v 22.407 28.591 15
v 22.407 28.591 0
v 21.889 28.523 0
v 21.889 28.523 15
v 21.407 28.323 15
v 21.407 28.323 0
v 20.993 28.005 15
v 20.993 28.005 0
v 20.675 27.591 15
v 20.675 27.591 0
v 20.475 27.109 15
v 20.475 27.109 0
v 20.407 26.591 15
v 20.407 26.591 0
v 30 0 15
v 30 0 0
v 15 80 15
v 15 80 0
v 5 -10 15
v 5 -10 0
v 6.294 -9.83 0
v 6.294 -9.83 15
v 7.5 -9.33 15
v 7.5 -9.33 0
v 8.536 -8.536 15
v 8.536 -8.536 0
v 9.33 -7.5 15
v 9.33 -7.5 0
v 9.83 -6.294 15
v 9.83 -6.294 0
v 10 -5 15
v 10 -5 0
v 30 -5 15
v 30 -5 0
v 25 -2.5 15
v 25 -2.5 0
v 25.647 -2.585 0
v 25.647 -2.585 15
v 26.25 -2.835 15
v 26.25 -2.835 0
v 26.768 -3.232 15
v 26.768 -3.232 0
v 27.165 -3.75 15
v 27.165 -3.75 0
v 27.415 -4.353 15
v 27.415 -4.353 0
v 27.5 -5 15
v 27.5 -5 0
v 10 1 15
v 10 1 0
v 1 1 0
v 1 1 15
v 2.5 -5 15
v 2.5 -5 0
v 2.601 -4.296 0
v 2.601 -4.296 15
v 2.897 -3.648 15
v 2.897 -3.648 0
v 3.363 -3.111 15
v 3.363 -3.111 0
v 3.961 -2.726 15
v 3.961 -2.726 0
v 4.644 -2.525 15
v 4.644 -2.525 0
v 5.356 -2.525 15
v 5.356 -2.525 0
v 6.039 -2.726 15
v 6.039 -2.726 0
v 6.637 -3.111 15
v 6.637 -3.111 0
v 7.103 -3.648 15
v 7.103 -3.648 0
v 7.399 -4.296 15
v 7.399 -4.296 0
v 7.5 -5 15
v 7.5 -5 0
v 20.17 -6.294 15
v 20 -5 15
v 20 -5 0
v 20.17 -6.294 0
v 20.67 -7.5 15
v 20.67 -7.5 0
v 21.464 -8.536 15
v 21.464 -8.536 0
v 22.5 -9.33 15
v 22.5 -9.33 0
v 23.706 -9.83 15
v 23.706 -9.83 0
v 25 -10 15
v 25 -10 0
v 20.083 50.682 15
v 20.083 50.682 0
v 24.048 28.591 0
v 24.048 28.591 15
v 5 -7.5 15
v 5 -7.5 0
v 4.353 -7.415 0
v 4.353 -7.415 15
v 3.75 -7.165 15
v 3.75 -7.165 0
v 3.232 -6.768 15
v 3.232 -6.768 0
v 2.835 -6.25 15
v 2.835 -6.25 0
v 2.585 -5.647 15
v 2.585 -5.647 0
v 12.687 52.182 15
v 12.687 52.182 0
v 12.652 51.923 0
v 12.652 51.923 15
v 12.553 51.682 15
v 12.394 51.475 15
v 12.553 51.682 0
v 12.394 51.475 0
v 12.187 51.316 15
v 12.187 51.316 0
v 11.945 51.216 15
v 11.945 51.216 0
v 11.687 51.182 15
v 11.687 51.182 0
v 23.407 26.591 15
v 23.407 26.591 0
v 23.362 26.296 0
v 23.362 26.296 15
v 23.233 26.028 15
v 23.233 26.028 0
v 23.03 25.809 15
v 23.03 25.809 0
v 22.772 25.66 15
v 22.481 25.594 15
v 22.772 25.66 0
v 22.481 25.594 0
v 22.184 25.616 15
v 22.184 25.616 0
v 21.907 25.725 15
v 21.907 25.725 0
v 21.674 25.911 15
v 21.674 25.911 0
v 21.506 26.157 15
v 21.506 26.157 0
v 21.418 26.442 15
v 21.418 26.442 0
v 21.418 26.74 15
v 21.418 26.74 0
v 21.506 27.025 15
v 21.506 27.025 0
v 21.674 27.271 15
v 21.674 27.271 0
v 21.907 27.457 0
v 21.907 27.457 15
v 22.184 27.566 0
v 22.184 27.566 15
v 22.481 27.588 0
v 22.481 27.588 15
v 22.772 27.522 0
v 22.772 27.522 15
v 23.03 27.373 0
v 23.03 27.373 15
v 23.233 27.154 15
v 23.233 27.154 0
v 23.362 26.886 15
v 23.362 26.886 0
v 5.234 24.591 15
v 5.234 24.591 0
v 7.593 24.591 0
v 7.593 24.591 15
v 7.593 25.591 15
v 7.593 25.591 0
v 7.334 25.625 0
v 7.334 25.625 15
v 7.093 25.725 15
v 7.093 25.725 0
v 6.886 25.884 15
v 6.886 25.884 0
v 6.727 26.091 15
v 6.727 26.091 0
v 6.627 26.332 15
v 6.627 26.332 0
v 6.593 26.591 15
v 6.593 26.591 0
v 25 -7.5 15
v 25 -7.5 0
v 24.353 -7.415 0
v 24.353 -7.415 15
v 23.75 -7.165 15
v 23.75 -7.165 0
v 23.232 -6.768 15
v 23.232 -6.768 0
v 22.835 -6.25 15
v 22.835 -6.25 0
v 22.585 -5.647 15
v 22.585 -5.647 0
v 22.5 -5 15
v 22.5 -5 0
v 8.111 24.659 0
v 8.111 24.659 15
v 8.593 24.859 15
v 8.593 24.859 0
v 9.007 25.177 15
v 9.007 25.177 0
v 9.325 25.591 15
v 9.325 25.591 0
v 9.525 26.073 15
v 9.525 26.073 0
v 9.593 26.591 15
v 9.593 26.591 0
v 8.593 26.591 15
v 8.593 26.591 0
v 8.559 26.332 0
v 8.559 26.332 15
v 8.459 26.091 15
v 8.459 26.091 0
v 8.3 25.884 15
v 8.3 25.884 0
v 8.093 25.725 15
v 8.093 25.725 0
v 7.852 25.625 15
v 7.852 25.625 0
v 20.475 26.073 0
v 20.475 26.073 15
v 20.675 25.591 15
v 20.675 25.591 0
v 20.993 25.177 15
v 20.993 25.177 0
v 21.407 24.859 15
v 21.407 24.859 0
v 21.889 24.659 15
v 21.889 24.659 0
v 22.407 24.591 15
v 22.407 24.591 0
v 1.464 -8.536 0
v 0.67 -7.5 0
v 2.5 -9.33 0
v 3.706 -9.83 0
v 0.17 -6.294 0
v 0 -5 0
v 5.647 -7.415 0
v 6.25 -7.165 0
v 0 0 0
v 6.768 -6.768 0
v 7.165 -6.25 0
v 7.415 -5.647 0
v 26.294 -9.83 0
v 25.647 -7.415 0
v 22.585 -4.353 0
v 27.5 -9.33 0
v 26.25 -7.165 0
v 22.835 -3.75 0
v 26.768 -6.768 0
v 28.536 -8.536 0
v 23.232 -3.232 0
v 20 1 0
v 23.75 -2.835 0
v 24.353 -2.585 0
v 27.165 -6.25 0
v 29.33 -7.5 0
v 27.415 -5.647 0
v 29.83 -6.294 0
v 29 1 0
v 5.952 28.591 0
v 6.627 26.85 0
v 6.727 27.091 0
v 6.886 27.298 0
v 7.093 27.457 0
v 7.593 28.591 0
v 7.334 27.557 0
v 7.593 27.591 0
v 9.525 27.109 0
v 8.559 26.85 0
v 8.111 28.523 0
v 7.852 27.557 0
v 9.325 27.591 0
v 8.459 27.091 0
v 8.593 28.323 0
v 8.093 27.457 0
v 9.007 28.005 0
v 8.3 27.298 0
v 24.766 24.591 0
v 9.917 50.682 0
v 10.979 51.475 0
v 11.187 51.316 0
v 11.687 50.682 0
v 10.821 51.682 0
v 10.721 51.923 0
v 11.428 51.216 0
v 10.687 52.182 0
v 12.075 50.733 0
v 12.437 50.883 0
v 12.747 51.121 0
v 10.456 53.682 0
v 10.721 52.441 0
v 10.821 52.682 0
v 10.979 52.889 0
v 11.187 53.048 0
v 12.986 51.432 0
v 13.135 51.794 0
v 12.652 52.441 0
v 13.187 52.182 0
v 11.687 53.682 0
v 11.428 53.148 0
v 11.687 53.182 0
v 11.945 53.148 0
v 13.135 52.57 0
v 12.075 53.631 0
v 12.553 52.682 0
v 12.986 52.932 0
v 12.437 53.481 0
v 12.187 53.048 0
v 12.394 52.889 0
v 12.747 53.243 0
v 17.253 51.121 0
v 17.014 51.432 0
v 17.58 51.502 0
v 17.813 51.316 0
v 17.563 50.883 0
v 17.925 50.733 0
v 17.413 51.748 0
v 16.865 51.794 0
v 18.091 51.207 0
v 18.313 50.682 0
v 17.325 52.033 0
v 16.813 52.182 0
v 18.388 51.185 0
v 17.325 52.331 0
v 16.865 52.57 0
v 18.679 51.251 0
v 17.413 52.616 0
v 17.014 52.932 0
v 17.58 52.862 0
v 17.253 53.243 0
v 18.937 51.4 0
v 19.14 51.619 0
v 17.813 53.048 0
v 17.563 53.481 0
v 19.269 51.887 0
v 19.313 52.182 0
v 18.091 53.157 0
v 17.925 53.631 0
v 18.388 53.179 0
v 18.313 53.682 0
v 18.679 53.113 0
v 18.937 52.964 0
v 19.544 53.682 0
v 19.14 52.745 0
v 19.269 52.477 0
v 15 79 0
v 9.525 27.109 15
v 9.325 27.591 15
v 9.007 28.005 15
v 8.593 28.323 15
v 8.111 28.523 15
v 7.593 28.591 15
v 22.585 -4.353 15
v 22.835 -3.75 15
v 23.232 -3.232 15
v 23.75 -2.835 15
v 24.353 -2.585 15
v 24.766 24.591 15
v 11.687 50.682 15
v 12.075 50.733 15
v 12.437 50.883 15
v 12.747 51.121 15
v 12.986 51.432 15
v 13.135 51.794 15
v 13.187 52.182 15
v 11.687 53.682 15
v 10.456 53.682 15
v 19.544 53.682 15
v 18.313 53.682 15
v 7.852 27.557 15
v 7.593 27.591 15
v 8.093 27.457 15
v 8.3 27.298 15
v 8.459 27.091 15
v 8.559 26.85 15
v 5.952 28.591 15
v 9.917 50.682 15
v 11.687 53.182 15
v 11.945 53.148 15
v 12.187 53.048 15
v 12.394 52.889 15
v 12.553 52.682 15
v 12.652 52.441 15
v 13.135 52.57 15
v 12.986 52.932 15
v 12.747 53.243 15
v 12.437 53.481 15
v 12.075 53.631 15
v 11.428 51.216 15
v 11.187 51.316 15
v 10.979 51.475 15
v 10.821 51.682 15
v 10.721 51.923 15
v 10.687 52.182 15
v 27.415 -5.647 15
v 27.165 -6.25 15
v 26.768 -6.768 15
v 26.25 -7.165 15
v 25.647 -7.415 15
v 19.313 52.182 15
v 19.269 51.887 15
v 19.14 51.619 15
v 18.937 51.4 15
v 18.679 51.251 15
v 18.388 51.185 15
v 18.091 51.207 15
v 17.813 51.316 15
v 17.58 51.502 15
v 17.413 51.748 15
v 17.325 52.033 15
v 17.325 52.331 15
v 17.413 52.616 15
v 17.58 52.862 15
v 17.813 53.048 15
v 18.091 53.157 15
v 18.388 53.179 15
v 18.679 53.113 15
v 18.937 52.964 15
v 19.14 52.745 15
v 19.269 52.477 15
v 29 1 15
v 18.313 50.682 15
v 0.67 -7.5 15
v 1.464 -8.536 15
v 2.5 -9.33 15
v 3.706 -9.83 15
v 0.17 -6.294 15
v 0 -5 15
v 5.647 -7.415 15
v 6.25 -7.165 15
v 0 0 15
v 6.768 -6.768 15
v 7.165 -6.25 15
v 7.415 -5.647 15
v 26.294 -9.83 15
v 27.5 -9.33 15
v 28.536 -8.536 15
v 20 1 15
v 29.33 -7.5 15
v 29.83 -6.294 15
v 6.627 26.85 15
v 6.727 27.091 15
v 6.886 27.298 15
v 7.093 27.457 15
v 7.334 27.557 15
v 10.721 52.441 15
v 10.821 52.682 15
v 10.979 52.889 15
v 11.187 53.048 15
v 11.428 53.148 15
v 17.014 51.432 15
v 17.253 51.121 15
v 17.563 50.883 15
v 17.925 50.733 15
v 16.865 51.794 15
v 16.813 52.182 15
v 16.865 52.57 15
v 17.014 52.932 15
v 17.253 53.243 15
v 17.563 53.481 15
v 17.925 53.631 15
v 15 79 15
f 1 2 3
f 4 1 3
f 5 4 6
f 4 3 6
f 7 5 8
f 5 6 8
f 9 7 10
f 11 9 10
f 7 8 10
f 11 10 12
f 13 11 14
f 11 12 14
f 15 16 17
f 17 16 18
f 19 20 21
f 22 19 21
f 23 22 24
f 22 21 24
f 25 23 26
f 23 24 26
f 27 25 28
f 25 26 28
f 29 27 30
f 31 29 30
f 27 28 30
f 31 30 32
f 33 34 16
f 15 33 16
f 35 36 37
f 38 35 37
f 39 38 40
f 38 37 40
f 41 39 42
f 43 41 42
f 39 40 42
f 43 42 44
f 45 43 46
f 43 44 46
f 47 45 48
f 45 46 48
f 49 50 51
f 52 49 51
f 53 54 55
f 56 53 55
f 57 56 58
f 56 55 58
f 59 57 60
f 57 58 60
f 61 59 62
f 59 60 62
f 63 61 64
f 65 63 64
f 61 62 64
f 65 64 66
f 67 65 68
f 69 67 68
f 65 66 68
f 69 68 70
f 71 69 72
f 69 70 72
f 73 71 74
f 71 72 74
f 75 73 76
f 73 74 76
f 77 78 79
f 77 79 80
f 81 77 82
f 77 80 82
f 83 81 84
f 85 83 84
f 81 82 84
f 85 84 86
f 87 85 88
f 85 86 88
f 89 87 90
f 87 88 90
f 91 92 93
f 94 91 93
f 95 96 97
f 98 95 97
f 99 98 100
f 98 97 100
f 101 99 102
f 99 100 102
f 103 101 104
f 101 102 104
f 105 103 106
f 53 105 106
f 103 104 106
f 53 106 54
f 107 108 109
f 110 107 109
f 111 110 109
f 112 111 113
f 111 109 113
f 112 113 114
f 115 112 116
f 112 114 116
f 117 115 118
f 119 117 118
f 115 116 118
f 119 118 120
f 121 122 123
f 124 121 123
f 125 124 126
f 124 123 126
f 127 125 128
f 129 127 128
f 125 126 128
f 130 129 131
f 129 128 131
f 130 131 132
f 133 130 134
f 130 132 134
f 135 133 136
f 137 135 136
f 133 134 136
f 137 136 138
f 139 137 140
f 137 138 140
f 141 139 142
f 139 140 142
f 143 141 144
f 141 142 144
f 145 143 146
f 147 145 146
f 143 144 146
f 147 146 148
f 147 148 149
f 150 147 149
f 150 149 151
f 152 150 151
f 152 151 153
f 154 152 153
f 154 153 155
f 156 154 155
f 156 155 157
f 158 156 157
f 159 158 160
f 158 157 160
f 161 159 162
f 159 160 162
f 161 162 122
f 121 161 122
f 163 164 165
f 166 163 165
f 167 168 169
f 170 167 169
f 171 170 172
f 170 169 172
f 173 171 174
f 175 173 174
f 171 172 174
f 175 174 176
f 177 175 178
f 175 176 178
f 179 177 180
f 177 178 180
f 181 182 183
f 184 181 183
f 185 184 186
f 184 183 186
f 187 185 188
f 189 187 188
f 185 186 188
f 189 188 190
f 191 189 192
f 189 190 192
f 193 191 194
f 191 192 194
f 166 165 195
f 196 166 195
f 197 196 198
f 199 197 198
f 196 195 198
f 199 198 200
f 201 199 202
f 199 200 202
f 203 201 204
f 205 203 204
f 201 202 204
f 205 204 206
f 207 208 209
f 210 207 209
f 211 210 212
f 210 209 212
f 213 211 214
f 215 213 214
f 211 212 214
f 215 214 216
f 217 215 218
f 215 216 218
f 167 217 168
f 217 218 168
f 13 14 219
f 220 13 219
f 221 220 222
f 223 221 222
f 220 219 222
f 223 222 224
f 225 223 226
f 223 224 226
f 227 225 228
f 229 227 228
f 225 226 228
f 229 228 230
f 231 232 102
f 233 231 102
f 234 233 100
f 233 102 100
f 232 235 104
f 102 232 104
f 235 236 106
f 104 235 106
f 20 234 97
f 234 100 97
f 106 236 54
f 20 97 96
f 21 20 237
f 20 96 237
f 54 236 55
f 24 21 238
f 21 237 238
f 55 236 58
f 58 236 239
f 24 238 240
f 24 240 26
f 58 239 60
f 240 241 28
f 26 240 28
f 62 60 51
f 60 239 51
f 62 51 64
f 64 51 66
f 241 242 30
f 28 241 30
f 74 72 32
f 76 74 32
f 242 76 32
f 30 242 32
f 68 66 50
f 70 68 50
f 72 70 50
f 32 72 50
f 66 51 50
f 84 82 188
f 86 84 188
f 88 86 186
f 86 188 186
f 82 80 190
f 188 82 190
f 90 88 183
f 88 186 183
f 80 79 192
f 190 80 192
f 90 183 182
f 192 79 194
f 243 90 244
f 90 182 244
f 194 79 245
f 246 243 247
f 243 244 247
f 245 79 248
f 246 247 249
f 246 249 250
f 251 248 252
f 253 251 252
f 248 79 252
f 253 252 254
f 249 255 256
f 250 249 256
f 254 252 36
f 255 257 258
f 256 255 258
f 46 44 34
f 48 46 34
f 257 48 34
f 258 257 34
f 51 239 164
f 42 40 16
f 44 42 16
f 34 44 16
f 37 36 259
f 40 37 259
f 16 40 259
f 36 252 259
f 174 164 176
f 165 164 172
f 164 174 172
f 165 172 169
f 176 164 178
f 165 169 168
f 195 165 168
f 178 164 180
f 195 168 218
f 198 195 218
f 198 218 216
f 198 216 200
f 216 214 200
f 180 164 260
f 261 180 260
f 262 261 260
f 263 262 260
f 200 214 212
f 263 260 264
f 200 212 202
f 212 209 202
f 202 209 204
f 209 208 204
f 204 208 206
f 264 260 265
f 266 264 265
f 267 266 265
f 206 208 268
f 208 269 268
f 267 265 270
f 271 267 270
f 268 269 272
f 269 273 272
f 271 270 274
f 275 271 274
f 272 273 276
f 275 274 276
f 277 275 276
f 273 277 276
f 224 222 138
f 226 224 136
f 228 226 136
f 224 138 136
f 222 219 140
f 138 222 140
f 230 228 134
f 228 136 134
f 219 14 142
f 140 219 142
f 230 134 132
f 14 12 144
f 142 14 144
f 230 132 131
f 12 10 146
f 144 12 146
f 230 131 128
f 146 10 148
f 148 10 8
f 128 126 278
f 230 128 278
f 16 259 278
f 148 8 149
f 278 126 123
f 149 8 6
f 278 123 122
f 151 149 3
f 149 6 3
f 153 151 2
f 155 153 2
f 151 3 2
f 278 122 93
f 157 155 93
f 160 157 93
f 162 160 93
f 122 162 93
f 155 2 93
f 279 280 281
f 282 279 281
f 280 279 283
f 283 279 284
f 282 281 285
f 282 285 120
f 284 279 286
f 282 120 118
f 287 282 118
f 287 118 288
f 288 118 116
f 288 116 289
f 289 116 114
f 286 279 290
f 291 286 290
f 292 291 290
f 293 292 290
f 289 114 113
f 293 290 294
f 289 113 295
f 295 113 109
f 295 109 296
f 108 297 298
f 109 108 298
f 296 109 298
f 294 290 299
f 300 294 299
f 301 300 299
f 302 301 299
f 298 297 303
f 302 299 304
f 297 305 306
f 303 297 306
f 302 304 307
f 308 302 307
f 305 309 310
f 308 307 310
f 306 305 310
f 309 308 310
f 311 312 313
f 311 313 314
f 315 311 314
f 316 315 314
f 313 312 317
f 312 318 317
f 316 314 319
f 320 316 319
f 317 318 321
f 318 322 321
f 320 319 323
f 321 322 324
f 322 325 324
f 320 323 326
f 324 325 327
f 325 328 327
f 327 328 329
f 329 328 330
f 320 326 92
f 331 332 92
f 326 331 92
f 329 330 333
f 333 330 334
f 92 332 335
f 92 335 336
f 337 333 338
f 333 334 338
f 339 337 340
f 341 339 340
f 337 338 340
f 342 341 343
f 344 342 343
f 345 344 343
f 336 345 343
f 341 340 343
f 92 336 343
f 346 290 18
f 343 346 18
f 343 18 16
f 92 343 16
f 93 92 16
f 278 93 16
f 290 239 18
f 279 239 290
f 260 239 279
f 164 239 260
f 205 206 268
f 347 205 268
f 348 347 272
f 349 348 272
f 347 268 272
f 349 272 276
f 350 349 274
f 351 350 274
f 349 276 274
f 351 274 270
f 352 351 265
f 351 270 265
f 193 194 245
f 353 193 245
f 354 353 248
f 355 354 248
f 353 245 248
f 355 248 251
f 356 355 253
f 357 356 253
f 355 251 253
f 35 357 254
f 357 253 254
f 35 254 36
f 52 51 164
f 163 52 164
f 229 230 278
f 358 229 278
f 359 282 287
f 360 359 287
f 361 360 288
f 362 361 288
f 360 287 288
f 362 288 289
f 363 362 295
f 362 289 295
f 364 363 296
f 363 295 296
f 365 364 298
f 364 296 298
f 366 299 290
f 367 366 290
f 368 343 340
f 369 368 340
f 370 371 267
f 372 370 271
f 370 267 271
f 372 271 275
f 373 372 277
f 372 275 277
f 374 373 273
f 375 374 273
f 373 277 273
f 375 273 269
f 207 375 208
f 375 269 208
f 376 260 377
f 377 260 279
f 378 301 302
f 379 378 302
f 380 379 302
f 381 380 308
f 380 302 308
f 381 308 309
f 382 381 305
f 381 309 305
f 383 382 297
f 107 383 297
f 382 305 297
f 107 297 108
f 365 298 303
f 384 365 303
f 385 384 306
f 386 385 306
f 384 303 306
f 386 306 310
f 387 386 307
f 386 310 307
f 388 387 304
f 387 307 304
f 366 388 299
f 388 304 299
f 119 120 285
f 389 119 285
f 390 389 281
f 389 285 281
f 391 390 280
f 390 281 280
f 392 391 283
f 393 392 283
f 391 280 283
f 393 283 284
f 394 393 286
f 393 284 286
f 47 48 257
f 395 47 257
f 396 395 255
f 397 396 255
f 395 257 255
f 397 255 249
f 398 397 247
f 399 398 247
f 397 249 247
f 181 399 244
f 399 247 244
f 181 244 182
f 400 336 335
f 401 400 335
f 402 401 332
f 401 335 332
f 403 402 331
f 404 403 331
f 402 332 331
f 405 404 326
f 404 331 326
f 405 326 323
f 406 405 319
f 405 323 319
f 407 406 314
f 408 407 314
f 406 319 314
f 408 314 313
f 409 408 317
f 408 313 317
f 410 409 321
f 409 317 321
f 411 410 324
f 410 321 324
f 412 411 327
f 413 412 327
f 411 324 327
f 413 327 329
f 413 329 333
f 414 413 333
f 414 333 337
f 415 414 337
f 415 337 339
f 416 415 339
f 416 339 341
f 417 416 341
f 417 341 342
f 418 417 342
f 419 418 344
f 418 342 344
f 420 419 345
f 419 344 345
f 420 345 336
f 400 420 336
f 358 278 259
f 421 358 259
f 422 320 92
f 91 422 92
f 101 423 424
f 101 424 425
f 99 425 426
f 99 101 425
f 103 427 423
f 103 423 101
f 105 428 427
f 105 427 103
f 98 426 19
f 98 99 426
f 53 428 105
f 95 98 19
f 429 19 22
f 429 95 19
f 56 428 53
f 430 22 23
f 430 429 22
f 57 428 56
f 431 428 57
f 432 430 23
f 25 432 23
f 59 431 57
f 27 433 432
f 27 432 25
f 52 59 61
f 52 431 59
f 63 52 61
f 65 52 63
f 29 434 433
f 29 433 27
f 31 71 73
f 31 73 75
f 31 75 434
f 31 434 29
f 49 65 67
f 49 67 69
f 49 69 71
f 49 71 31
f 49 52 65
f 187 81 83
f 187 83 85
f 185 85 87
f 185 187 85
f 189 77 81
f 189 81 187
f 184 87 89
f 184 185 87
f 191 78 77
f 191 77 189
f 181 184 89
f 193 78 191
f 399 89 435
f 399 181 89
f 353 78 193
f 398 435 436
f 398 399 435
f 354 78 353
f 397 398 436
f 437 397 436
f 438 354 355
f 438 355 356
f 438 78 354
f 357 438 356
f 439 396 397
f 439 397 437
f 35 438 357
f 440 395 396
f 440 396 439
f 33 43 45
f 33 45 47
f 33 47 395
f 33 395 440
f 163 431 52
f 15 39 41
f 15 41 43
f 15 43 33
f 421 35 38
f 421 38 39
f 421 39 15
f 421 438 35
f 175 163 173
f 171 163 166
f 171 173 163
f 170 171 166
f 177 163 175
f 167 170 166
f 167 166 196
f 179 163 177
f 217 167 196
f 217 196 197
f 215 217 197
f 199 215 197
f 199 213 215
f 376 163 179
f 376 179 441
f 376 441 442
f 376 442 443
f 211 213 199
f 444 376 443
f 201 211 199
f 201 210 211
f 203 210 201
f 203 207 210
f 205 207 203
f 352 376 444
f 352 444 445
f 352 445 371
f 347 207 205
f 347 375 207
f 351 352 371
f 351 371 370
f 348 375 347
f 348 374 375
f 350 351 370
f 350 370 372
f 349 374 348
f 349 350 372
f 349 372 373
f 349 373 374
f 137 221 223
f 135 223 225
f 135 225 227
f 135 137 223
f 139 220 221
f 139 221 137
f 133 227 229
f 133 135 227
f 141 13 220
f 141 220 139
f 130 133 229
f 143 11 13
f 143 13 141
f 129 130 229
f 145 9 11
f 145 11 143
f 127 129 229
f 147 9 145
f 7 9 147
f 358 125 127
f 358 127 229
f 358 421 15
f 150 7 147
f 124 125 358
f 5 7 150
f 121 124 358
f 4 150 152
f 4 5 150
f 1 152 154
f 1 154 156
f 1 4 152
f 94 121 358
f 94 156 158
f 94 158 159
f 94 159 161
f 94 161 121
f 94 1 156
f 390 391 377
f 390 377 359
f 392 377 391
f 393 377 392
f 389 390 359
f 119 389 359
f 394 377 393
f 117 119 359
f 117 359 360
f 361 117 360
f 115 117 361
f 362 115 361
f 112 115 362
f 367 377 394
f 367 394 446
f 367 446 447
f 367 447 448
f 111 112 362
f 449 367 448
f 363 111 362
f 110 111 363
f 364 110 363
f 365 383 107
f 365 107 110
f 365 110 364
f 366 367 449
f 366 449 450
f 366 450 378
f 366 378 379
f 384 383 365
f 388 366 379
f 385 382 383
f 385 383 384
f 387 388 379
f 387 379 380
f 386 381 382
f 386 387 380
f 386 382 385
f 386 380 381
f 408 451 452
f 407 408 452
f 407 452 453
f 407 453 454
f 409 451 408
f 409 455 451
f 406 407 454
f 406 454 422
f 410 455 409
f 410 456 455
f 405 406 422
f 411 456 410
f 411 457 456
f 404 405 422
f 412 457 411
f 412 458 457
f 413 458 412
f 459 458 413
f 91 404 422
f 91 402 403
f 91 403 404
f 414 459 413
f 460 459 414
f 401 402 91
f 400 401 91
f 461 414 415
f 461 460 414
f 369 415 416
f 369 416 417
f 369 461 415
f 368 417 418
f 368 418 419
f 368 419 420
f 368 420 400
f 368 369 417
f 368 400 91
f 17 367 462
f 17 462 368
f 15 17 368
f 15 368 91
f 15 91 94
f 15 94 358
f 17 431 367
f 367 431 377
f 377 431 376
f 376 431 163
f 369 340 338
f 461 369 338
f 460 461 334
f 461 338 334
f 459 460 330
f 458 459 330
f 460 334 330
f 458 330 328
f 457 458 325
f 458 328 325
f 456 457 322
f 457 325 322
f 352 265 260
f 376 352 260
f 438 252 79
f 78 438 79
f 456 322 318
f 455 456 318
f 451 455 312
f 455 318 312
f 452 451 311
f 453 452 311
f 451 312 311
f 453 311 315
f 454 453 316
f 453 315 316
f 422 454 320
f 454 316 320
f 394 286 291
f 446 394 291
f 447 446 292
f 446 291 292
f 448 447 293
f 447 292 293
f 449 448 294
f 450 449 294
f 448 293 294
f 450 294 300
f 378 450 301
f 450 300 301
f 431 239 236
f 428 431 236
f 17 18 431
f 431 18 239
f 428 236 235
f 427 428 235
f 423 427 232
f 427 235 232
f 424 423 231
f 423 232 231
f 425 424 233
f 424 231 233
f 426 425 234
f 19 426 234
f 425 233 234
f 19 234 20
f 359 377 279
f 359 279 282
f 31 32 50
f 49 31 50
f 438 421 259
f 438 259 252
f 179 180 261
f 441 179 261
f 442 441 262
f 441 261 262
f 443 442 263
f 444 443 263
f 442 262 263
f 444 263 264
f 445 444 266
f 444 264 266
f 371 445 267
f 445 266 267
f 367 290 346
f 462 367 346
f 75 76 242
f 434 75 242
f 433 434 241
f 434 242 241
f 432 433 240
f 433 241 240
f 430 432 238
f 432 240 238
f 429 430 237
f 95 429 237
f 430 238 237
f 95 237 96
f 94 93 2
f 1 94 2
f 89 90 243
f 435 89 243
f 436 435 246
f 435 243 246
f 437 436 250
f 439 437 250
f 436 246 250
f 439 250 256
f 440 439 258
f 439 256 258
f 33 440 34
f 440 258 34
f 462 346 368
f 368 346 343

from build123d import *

# Parameters (mm, degrees)
F1_DEPTH = 15


with BuildPart() as f1:
    # F0 (on Top) → F1 (new body)
    with BuildSketch(Plane.XY):
        Polygon((15, 80), (0, 0), (1, 0), (10, 0), (10, 1), (1, 1), (5.234291, 24.591051), (5.593266, 26.591051), (5.95224, 28.591051), (9.9173, 50.682103), (10.186531, 52.182103), (10.455762, 53.682103), (15, 79), (19.544238, 53.682103), (19.813469, 52.182103), (20.0827, 50.682103), (24.04776, 28.591051), (24.406734, 26.591051), (24.765709, 24.591051), (29, 1), (20, 1), (20, 0), (25, 0), (30, 0), align=None)
        with BuildLine():
            Line((1, 0), (0, 0))
            Line((0, 0), (0, -5))
            Line((0, -5), (2.5, -5))
            ThreePointArc((2.5, -5), (5, -2.5), (7.5, -5))
            Line((7.5, -5), (10, -5))
            Line((10, -5), (10, 0))
            Line((10, 0), (1, 0))
        make_face()
        with BuildLine():
            Line((2.5, -5), (0, -5))
            ThreePointArc((0, -5), (1.464466, -8.535534), (5, -10))
            Line((5, -10), (5, -7.5))
            ThreePointArc((5, -7.5), (3.232233, -6.767767), (2.5, -5))
        make_face()
        with BuildLine():
            Line((30, -5), (30, 0))
            Line((30, 0), (25, 0))
            Line((25, 0), (25, -2.5))
            ThreePointArc((25, -2.5), (26.767767, -3.232233), (27.5, -5))
            Line((27.5, -5), (30, -5))
        make_face()
        with BuildLine():
            Line((5, -7.5), (5, -10))
            ThreePointArc((5, -10), (8.535534, -8.535534), (10, -5))
            Line((10, -5), (7.5, -5))
            ThreePointArc((7.5, -5), (6.767767, -6.767767), (5, -7.5))
        make_face()
        with BuildLine():
            Line((25, -2.5), (25, 0))
            Line((25, 0), (20, 0))
            Line((20, 0), (20, -5))
            Line((20, -5), (22.5, -5))
            ThreePointArc((22.5, -5), (23.232233, -3.232233), (25, -2.5))
        make_face()
        with BuildLine():
            ThreePointArc((25, -10), (28.535534, -8.535534), (30, -5))
            Line((30, -5), (27.5, -5))
            ThreePointArc((27.5, -5), (26.767767, -6.767767), (25, -7.5))
            Line((25, -7.5), (25, -10))
        make_face()
        with BuildLine():
            ThreePointArc((20, -5), (21.464466, -8.535534), (25, -10))
            Line((25, -10), (25, -7.5))
            ThreePointArc((25, -7.5), (23.232233, -6.767767), (22.5, -5))
            Line((22.5, -5), (20, -5))
        make_face()
        with BuildLine():
            Line((5.593266, 26.591051), (5.234291, 24.591051))
            Line((5.234291, 24.591051), (7.593266, 24.591051))
            Line((7.593266, 24.591051), (7.593266, 25.591051))
            ThreePointArc((7.593266, 25.591051), (6.886159, 25.883945), (6.593266, 26.591051))
            Line((6.593266, 26.591051), (5.593266, 26.591051))
        make_face()
        with BuildLine():
            Line((5.95224, 28.591051), (5.593266, 26.591051))
            Line((5.593266, 26.591051), (6.593266, 26.591051))
            ThreePointArc((6.593266, 26.591051), (6.886159, 27.298158), (7.593266, 27.591051))
            Line((7.593266, 27.591051), (7.593266, 28.591051))
            Line((7.593266, 28.591051), (5.95224, 28.591051))
        make_face()
        with BuildLine():
            Line((7.593266, 25.591051), (7.593266, 24.591051))
            ThreePointArc((7.593266, 24.591051), (9.007479, 25.176838), (9.593266, 26.591051))
            Line((9.593266, 26.591051), (8.593266, 26.591051))
            ThreePointArc((8.593266, 26.591051), (8.300372, 25.883945), (7.593266, 25.591051))
        make_face()
        with BuildLine():
            Line((8.593266, 26.591051), (9.593266, 26.591051))
            ThreePointArc((9.593266, 26.591051), (9.007479, 28.005265), (7.593266, 28.591051))
            Line((7.593266, 28.591051), (7.593266, 27.591051))
            ThreePointArc((7.593266, 27.591051), (8.300372, 27.298158), (8.593266, 26.591051))
        make_face()
        with BuildLine():
            Line((22.406734, 24.591051), (24.765709, 24.591051))
            Line((24.765709, 24.591051), (24.406734, 26.591051))
            Line((24.406734, 26.591051), (23.406734, 26.591051))
            ThreePointArc((23.406734, 26.591051), (22.406734, 25.591051), (21.406734, 26.591051))
            Line((21.406734, 26.591051), (20.406734, 26.591051))
            ThreePointArc((20.406734, 26.591051), (20.992521, 25.176838), (22.406734, 24.591051))
        make_face()
        with BuildLine():
            Line((10.186531, 52.182103), (9.9173, 50.682103))
            Line((9.9173, 50.682103), (11.686531, 50.682103))
            Line((11.686531, 50.682103), (11.686531, 51.182103))
            ThreePointArc((11.686531, 51.182103), (10.979424, 51.474996), (10.686531, 52.182103))
            Line((10.686531, 52.182103), (10.186531, 52.182103))
        make_face()
        with BuildLine():
            Line((23.406734, 26.591051), (24.406734, 26.591051))
            Line((24.406734, 26.591051), (24.04776, 28.591051))
            Line((24.04776, 28.591051), (22.406734, 28.591051))
            ThreePointArc((22.406734, 28.591051), (20.992521, 28.005265), (20.406734, 26.591051))
            Line((20.406734, 26.591051), (21.406734, 26.591051))
            ThreePointArc((21.406734, 26.591051), (22.406734, 27.591051), (23.406734, 26.591051))
        make_face()
        with BuildLine():
            Line((10.455762, 53.682103), (10.186531, 52.182103))
            Line((10.186531, 52.182103), (10.686531, 52.182103))
            ThreePointArc((10.686531, 52.182103), (10.979424, 52.88921), (11.686531, 53.182103))
            Line((11.686531, 53.182103), (11.686531, 53.682103))
            Line((11.686531, 53.682103), (10.455762, 53.682103))
        make_face()
        with BuildLine():
            Line((11.686531, 51.182103), (11.686531, 50.682103))
            ThreePointArc((11.686531, 50.682103), (12.747191, 51.121443), (13.186531, 52.182103))
            Line((13.186531, 52.182103), (12.686531, 52.182103))
            ThreePointArc((12.686531, 52.182103), (12.393638, 51.474996), (11.686531, 51.182103))
        make_face()
        with BuildLine():
            Line((12.686531, 52.182103), (13.186531, 52.182103))
            ThreePointArc((13.186531, 52.182103), (12.747191, 53.242763), (11.686531, 53.682103))
            Line((11.686531, 53.682103), (11.686531, 53.182103))
            ThreePointArc((11.686531, 53.182103), (12.393638, 52.88921), (12.686531, 52.182103))
        make_face()
        with BuildLine():
            Line((18.313469, 50.682103), (20.0827, 50.682103))
            Line((20.0827, 50.682103), (19.813469, 52.182103))
            Line((19.813469, 52.182103), (19.313469, 52.182103))
            ThreePointArc((19.313469, 52.182103), (18.313469, 51.182103), (17.313469, 52.182103))
            Line((17.313469, 52.182103), (16.813469, 52.182103))
            ThreePointArc((16.813469, 52.182103), (17.252809, 51.121443), (18.313469, 50.682103))
        make_face()
        with BuildLine():
            Line((19.313469, 52.182103), (19.813469, 52.182103))
            Line((19.813469, 52.182103), (19.544238, 53.682103))
            Line((19.544238, 53.682103), (18.313469, 53.682103))
            ThreePointArc((18.313469, 53.682103), (17.252809, 53.242763), (16.813469, 52.182103))
            Line((16.813469, 52.182103), (17.313469, 52.182103))
            ThreePointArc((17.313469, 52.182103), (18.313469, 53.182103), (19.313469, 52.182103))
        make_face()
    extrude(amount=F1_DEPTH)


solid = f1.part
